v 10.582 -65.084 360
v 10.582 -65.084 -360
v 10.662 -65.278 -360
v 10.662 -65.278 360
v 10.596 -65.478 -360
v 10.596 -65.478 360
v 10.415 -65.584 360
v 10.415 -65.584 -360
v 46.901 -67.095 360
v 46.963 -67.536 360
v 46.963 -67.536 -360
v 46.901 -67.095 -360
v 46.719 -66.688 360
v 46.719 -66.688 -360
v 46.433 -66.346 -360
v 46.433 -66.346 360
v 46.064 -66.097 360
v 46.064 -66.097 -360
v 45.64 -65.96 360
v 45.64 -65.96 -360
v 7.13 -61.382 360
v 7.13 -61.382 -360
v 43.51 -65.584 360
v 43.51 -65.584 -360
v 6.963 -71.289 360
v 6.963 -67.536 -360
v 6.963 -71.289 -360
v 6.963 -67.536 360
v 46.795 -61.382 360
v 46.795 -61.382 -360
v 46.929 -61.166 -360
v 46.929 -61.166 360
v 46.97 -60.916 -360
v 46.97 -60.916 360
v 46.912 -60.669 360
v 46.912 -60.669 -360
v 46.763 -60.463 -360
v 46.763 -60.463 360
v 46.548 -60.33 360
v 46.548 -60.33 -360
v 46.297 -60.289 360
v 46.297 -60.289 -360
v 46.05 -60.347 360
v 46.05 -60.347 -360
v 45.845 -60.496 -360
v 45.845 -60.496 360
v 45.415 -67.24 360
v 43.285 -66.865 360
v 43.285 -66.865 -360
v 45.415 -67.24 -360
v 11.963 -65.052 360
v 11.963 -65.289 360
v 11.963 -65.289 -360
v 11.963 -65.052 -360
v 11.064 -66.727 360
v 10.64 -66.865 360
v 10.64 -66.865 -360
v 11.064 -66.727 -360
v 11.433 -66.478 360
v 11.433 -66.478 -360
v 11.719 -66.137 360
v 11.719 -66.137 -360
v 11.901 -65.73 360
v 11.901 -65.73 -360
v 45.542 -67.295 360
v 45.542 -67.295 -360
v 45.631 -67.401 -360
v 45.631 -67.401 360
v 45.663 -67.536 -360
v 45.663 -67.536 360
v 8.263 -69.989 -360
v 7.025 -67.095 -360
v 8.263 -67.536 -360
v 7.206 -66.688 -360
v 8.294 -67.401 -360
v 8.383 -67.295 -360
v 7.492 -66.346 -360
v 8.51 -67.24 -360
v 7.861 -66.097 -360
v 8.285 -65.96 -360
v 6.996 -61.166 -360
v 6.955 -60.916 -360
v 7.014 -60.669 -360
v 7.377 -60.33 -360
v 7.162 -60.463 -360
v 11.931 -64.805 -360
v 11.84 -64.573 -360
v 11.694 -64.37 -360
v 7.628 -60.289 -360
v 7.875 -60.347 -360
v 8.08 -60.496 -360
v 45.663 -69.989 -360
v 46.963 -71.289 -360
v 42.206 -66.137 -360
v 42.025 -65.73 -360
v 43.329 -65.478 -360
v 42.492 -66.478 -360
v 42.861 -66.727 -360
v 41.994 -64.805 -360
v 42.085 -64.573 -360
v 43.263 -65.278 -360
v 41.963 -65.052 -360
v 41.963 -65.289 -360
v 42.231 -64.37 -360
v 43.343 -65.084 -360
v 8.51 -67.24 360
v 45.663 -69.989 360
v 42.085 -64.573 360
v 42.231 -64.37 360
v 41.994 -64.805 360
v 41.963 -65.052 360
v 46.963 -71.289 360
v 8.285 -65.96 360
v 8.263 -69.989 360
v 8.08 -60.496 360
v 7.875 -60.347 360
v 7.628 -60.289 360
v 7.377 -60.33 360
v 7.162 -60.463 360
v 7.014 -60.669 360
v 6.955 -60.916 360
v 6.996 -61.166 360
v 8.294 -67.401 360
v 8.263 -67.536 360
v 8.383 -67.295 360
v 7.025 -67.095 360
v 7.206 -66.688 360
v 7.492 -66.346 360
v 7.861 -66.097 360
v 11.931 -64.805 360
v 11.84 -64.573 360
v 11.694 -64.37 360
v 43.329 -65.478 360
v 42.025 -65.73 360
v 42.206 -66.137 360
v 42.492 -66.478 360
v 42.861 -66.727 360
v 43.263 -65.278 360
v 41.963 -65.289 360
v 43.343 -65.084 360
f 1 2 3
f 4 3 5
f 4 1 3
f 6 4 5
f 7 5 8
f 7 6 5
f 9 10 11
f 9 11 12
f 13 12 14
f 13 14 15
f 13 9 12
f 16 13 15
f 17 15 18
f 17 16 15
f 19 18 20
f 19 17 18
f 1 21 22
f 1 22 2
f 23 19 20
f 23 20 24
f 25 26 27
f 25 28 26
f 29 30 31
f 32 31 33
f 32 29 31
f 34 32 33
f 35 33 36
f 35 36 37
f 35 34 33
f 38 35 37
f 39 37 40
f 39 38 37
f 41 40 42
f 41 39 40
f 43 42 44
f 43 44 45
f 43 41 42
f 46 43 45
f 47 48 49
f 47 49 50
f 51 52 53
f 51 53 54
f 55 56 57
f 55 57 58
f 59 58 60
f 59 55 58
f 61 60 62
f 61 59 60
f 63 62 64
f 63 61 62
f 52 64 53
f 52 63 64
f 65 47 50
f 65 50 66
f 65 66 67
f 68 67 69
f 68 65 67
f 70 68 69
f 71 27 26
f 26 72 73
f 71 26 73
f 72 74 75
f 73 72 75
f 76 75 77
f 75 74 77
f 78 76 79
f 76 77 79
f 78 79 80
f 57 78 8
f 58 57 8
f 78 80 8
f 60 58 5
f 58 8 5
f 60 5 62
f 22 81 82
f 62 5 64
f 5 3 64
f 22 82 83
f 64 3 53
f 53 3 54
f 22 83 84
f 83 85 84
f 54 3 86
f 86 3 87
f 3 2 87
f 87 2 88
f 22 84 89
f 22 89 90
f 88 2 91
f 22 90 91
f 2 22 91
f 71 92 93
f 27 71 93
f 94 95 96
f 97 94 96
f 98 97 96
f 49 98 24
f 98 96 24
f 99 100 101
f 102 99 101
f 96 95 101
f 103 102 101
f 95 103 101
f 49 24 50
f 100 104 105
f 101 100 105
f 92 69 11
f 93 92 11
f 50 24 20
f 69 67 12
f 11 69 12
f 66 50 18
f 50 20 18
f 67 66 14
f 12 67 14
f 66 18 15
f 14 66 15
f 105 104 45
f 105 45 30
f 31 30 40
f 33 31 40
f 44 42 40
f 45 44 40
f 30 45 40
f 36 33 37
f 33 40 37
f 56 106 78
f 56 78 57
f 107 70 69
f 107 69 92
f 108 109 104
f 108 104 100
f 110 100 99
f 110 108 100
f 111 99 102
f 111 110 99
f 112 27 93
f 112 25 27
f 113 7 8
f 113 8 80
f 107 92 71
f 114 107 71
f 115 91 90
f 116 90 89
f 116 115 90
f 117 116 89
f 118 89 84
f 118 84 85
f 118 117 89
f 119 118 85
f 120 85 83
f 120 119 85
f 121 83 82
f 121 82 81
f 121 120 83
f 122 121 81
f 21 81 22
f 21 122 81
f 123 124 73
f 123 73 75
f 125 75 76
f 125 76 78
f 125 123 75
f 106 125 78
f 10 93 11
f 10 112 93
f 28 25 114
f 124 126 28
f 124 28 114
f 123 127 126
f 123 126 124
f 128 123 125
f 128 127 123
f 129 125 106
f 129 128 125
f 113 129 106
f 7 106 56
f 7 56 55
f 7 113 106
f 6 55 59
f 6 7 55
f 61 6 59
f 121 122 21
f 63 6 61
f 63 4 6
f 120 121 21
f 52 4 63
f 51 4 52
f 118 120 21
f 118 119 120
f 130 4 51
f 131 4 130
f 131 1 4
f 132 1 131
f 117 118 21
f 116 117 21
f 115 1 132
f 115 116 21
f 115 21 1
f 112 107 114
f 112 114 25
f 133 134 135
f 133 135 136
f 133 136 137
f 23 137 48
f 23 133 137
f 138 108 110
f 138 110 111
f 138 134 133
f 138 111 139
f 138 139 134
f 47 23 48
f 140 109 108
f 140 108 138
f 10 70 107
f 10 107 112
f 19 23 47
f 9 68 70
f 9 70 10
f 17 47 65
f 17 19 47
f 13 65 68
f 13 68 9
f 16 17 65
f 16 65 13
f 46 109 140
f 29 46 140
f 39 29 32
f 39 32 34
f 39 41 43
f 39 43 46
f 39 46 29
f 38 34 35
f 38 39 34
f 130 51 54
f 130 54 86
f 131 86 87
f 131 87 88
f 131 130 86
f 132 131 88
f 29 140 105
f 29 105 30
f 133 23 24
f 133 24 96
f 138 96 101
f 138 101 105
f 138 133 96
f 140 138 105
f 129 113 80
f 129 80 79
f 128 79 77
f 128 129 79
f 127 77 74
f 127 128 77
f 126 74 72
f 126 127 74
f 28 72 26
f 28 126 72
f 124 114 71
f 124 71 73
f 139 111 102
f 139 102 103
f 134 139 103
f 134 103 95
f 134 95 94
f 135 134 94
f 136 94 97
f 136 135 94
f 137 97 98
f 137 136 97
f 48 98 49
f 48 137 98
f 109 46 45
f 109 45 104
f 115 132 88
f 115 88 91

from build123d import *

# Parameters (mm, degrees)
BOSS_EXTRUDE1_DEPTH = 360


with BuildPart() as part:
    # Sketch1 → Boss-Extrude1 (new, symmetric)
    with BuildSketch(Plane.XY):
        with BuildLine():
            Line((46.962560252, -71.288832462), (46.962560252, -67.53553159))
            ThreePointArc((46.962560252, -67.53553159), (46.588231361, -66.507071414), (45.640397337, -65.959839185))
            Line((45.640397337, -65.959839185), (43.510465799, -65.584274788))
            ThreePointArc((43.510465799, -65.584274788), (43.278063156, -65.384023859), (43.343154142, -65.084232954))
            Line((43.343154142, -65.084232954), (46.795419695, -61.382131396))
            ThreePointArc((46.795419695, -61.382131396), (46.763338723, -60.463452556), (45.844659883, -60.495533528))
            Line((45.844659883, -60.495533528), (42.231206551, -64.370487816))
            ThreePointArc((42.231206551, -64.370487816), (42.032142684, -64.68598495), (41.962560252, -65.052486177))
            Line((41.962560252, -65.052486177), (41.962560252, -65.288832462))
            ThreePointArc((41.962560252, -65.288832462), (42.336889143, -66.317292637), (43.284723168, -66.864524867))
            Line((43.284723168, -66.864524867), (45.414654706, -67.240089264))
            ThreePointArc((45.414654706, -67.240089264), (45.592373585, -67.342695307), (45.662560252, -67.53553159))
            Line((45.662560252, -67.53553159), (45.662560252, -69.988832462))
            Line((45.662560252, -69.988832462), (8.262560252, -69.988832462))
            Line((8.262560252, -69.988832462), (8.262560252, -67.53553159))
            ThreePointArc((8.262560252, -67.53553159), (8.332746919, -67.342695307), (8.510465799, -67.240089264))
            Line((8.510465799, -67.240089264), (10.640397337, -66.864524867))
            ThreePointArc((10.640397337, -66.864524867), (11.588231361, -66.317292637), (11.962560252, -65.288832462))
            Line((11.962560252, -65.288832462), (11.962560252, -65.052486177))
            ThreePointArc((11.962560252, -65.052486177), (11.89297782, -64.68598495), (11.693913954, -64.370487816))
            Line((11.693913954, -64.370487816), (8.080460622, -60.495533528))
            ThreePointArc((8.080460622, -60.495533528), (7.161781782, -60.463452556), (7.12970081, -61.382131396))
            Line((7.12970081, -61.382131396), (10.581966363, -65.084232954))
            ThreePointArc((10.581966363, -65.084232954), (10.647057349, -65.384023859), (10.414654706, -65.584274788))
            Line((10.414654706, -65.584274788), (8.284723168, -65.959839185))
            ThreePointArc((8.284723168, -65.959839185), (7.336889143, -66.507071414), (6.962560252, -67.53553159))
            Line((6.962560252, -67.53553159), (6.962560252, -71.288832462))
            Line((6.962560252, -71.288832462), (46.962560252, -71.288832462))
        make_face()
    extrude(amount=BOSS_EXTRUDE1_DEPTH, both=True)


solid = part.part
